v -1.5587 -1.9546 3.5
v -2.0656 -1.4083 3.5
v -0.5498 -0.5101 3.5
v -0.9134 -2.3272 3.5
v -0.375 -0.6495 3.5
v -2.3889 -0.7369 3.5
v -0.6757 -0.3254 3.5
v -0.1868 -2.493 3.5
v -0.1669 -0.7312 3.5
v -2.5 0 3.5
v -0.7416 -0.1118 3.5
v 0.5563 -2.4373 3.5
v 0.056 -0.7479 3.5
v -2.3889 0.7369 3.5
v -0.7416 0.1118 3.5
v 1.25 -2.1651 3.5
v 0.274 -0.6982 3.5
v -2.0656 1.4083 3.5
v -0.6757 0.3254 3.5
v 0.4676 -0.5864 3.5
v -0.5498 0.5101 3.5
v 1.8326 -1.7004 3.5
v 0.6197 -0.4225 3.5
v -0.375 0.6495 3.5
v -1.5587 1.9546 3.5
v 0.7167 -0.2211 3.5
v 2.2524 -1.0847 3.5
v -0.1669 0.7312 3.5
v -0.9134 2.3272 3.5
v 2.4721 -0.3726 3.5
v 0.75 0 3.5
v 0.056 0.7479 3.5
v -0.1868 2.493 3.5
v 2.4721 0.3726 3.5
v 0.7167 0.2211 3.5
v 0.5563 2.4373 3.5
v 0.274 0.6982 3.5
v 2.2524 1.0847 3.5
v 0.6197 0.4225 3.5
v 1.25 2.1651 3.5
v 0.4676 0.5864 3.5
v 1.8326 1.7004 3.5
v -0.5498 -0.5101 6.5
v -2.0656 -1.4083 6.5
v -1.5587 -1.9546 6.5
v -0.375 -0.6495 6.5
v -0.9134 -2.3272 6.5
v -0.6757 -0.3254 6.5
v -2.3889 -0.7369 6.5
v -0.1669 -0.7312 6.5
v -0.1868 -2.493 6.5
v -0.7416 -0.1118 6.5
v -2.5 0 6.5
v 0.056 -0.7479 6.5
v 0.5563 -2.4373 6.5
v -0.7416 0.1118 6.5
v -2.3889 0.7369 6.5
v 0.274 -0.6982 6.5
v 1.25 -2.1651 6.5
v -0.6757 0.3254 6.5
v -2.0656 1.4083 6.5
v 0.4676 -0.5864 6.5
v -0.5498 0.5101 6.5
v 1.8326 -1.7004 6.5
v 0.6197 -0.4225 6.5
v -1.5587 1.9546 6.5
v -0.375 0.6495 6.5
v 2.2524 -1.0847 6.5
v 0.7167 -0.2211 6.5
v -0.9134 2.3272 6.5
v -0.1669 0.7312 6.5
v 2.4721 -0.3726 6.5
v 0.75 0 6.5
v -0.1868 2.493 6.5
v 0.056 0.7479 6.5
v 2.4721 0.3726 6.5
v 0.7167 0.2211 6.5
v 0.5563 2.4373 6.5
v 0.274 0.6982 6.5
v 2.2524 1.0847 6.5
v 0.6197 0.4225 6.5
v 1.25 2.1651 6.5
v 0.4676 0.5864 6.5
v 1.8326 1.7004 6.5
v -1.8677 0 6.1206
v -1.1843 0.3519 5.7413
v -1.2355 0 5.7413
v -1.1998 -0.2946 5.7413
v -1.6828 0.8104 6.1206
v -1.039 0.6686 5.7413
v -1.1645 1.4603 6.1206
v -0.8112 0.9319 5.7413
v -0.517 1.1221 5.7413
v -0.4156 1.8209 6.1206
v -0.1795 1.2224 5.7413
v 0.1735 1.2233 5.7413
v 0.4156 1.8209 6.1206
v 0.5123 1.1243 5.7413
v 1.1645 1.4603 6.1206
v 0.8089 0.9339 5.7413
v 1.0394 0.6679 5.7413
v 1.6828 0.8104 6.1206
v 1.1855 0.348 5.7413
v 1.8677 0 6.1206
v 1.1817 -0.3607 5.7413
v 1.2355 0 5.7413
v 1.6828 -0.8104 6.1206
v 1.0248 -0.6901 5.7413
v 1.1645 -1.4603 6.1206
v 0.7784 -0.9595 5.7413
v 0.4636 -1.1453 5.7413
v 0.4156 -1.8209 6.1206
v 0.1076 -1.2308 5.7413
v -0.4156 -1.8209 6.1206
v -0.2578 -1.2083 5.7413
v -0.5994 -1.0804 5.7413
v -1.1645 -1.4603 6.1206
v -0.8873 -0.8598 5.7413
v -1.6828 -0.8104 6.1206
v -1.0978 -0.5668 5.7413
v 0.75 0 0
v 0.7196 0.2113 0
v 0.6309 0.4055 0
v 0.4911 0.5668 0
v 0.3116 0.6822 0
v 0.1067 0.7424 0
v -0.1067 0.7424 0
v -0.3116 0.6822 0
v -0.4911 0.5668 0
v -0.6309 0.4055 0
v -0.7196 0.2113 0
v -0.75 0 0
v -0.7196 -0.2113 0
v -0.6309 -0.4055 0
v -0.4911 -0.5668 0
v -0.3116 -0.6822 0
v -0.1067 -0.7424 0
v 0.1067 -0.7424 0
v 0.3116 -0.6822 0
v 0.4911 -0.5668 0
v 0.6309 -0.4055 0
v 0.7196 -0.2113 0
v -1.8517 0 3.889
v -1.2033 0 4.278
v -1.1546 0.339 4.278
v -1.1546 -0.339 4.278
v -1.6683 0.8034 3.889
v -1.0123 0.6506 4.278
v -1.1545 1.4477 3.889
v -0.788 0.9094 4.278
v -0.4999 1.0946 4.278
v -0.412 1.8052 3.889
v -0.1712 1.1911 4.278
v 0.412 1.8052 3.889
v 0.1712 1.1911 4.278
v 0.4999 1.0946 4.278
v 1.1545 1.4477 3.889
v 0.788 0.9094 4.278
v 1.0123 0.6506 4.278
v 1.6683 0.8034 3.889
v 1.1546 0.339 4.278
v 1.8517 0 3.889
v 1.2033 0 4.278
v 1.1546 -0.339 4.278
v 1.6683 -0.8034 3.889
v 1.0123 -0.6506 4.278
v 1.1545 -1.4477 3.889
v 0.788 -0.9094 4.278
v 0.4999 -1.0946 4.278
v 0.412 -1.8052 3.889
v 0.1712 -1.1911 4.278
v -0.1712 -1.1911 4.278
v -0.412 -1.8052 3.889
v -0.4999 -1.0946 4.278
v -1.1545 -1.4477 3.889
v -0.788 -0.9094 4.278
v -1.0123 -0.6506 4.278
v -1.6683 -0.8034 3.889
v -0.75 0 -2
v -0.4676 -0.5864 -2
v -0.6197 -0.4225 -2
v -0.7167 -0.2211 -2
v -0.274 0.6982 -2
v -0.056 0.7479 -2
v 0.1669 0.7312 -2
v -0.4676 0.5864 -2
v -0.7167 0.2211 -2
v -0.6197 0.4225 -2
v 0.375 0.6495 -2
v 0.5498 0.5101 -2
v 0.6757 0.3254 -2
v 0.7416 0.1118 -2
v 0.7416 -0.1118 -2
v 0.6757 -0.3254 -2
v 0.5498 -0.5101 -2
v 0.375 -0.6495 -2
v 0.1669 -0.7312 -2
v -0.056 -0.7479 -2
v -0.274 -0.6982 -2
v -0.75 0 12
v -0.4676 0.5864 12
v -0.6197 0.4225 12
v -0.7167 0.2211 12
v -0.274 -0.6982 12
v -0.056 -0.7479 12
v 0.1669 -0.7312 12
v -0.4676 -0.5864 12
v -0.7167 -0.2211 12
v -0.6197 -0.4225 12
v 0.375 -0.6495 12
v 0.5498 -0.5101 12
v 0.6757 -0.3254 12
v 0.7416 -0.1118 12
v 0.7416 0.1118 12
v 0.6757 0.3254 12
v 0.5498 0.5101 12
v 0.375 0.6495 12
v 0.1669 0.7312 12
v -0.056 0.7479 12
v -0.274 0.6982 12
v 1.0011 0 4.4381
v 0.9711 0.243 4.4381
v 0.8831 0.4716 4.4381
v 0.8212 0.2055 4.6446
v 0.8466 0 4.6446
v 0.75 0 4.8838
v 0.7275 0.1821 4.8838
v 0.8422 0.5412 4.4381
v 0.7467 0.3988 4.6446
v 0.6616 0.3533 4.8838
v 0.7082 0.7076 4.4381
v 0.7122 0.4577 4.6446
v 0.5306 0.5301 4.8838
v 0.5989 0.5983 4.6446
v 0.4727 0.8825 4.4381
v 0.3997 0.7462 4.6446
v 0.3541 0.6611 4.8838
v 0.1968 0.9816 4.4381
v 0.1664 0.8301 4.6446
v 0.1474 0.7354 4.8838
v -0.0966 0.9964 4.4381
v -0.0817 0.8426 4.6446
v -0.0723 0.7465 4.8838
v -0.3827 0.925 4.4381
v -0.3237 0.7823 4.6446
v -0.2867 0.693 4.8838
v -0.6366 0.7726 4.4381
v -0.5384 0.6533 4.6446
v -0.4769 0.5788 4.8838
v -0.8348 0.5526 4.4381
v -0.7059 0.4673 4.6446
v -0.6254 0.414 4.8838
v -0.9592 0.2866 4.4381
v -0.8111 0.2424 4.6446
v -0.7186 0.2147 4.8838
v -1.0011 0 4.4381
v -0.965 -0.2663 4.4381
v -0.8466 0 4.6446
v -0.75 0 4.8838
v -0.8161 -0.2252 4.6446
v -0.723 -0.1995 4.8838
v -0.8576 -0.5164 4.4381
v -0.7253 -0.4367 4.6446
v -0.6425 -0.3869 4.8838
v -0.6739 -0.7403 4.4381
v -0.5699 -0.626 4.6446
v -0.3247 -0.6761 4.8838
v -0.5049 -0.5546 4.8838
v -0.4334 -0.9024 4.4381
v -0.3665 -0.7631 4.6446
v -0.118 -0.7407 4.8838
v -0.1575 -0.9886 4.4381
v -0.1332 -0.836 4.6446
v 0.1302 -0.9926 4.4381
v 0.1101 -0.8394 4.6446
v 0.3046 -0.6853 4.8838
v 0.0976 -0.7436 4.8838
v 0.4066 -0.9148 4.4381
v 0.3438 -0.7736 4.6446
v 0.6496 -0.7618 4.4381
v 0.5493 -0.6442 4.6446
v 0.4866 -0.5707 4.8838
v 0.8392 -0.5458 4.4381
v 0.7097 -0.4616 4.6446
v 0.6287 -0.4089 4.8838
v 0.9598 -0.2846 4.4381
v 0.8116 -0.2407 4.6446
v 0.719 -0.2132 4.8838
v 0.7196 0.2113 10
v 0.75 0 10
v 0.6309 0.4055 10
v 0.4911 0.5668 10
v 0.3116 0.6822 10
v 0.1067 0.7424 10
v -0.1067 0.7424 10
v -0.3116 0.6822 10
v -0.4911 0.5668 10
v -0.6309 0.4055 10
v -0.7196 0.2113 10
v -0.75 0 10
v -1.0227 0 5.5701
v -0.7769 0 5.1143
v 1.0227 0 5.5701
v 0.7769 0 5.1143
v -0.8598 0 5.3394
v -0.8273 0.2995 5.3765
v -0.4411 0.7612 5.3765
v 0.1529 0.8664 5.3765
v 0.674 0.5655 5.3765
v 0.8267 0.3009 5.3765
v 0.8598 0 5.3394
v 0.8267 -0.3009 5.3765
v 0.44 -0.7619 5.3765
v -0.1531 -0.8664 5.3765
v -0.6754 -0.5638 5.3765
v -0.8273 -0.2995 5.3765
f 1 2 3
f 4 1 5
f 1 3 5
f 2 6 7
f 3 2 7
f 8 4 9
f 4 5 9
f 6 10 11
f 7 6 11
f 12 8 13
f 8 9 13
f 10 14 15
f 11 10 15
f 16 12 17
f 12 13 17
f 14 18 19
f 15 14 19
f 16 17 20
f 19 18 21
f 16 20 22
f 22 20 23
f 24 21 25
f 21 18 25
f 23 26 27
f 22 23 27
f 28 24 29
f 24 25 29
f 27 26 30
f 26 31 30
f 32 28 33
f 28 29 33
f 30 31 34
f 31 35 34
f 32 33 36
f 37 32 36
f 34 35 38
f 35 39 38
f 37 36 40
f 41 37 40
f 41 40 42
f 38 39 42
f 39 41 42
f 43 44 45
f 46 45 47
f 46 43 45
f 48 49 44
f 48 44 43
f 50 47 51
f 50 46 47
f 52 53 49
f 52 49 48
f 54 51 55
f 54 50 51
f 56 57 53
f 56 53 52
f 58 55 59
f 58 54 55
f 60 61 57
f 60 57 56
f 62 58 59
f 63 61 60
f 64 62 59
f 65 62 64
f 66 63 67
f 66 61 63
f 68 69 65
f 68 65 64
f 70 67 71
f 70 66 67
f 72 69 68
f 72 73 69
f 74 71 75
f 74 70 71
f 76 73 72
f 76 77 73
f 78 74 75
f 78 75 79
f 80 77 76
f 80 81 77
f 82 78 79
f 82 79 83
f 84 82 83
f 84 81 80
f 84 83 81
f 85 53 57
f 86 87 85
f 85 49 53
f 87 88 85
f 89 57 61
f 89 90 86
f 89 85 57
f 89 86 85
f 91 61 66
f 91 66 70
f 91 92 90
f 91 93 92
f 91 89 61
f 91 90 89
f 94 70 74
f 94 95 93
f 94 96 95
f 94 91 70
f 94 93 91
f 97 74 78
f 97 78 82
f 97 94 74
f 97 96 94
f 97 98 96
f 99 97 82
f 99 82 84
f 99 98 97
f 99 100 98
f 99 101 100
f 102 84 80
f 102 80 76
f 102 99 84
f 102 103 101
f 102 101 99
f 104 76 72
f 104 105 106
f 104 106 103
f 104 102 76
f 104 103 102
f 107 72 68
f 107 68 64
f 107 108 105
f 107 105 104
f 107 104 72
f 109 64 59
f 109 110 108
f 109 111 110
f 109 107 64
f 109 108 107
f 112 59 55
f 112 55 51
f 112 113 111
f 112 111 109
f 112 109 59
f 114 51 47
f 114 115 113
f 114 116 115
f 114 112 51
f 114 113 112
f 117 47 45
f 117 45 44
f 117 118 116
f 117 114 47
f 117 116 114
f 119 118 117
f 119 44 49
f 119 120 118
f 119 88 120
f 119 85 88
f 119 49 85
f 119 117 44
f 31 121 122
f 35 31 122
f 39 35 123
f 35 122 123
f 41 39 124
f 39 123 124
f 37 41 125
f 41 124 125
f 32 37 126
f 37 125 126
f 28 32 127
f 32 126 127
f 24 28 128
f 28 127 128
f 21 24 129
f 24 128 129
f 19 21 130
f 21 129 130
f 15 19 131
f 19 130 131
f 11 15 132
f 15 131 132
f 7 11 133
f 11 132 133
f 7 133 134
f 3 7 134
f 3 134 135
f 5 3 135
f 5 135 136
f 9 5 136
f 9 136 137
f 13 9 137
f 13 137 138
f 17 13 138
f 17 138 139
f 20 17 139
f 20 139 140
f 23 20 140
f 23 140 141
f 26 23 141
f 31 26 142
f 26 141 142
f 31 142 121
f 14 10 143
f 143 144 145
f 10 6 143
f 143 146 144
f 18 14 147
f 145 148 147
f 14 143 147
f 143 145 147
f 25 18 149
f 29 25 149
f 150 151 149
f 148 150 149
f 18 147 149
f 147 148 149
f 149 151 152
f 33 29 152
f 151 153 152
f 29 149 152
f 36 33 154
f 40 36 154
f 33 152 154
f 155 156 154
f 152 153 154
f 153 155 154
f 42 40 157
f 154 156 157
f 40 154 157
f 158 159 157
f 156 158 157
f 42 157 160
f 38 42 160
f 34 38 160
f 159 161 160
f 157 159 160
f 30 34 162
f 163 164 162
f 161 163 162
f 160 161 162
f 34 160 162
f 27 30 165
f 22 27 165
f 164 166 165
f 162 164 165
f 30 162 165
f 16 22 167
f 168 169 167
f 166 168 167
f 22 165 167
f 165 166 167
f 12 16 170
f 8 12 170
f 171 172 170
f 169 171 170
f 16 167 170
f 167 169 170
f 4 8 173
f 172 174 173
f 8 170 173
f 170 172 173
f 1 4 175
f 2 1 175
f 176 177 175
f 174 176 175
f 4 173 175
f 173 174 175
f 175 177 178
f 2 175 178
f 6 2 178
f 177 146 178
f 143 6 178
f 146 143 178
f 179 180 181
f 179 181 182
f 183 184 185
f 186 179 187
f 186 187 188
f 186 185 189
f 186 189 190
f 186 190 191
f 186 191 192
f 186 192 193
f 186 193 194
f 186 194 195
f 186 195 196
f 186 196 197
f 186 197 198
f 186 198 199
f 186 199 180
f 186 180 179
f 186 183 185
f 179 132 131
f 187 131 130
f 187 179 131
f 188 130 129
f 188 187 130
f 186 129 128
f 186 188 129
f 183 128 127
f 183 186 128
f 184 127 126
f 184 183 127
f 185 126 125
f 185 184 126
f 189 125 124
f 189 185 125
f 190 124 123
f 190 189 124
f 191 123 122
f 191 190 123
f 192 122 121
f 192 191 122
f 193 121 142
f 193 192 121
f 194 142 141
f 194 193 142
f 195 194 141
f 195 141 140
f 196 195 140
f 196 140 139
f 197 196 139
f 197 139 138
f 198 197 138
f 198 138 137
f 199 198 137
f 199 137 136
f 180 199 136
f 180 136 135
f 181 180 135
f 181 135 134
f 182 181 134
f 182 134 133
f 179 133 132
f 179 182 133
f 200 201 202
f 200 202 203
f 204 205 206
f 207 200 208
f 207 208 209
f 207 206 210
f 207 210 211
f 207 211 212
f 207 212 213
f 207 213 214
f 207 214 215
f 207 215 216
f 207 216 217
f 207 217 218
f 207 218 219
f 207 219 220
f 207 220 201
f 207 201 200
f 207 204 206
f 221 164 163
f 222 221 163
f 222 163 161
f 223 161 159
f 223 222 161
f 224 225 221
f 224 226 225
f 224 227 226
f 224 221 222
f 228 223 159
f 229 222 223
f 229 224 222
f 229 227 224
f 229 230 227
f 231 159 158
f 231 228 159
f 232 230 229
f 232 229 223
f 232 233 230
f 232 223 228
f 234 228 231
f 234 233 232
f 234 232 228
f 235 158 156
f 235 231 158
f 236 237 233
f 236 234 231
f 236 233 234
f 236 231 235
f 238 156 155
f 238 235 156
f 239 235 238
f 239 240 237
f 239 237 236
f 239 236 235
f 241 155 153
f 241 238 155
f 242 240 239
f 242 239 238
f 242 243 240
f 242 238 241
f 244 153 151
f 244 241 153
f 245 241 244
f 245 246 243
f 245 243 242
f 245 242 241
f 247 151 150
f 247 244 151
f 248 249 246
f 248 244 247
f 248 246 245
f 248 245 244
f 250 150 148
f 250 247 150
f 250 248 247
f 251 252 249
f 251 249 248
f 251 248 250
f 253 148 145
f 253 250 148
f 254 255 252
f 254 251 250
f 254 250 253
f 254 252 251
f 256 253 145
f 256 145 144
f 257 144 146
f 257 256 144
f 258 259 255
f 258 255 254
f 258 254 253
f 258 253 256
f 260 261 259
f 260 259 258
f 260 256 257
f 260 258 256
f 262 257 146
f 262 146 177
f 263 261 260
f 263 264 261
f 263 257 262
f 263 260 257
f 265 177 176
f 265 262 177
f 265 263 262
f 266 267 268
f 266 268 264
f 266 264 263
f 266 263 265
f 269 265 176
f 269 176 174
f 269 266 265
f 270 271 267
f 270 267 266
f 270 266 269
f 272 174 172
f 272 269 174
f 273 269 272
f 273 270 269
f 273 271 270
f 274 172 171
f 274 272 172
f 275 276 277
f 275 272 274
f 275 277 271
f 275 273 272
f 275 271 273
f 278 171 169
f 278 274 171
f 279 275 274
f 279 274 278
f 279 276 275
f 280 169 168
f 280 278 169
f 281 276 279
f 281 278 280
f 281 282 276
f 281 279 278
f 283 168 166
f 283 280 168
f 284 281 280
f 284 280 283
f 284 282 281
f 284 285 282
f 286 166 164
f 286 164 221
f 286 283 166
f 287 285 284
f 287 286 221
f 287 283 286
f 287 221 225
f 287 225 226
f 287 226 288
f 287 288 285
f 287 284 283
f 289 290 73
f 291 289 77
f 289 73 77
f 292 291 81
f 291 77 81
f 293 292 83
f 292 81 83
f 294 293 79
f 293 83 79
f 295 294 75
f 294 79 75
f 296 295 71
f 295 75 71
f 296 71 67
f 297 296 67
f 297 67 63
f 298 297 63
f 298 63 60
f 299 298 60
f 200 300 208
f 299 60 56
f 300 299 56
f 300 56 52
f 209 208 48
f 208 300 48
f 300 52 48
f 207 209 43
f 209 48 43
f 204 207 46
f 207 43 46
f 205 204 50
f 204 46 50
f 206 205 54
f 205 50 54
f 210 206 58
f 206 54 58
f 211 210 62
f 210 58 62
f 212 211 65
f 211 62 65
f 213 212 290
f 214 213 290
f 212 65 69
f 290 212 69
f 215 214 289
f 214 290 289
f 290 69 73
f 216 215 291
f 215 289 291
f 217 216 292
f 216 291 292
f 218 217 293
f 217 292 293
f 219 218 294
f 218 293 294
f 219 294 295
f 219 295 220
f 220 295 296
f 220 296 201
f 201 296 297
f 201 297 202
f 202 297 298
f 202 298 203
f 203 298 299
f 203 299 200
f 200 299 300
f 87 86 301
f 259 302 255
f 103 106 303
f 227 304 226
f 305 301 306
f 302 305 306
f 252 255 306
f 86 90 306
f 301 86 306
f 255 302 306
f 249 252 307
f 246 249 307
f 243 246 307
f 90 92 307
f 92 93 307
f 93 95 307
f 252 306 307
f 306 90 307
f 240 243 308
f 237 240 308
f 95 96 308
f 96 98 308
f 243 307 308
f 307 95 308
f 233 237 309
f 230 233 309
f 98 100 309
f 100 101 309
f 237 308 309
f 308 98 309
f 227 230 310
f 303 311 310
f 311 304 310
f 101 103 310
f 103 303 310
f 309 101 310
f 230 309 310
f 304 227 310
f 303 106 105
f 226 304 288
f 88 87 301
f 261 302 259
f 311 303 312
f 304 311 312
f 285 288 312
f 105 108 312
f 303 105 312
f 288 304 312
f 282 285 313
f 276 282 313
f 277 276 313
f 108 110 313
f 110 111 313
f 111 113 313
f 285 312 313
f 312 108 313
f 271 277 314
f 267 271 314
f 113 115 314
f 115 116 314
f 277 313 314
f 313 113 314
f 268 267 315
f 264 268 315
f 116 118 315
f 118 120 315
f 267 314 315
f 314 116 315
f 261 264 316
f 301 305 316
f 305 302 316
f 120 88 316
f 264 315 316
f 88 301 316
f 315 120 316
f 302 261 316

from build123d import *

# Parameters (mm, degrees)
SKETCH1_R           = 0.75
BOSS_EXTRUDE1_DEPTH = 10
FILLET3_R           = 1
BOSS_EXTRUDE3_START = 2
SKETCH4_R           = 0.75
BOSS_EXTRUDE3_DEPTH = 2
SKETCH5_R           = 0.75
BOSS_EXTRUDE4_DEPTH = 2


with BuildPart() as part:
    # Sketch1 → Boss-Extrude1 (new body)
    with BuildSketch(Plane.XY):
        Circle(SKETCH1_R)
    extrude(amount=BOSS_EXTRUDE1_DEPTH)

    # Sketch3 → Revolve1 (revolve)
    with BuildSketch(Plane(origin=(0, 0, 0), x_dir=(0, 0, -1), z_dir=(1, 0, 0)), mode=Mode.PRIVATE) as revolve1_sk:
        Polygon((-3.5, 0), (-3.5, 2.5), (-5, 0), align=None)
    revolve1 = revolve(revolve1_sk.sketch.rotate(Axis((0, 0, 5), (0, 0, -1)), 270), axis=Axis((0, 0, 5), (0, 0, -1)))

    # Mirror1: Revolve1 across plane
    add(revolve1.mirror(Plane(origin=(0, 0, 5), x_dir=(1, 0, 0), z_dir=(0, 0, -1))))

    # Fillet3
    fillet3_edges = [part.edges().sort_by_distance(p)[0] for p in [
        (0, -0.75, 5.45),
    ]]
    fillet(fillet3_edges, radius=FILLET3_R)

    # Fillet4: read off the stored shape, not the designer's step
    # Fillet4 outline → Fillet4 (revolve)
    with BuildSketch(Plane.XZ):
        with BuildLine():
            Line((0.75, 4.883809621), (0.75, 4.278013821))
            Line((0.75, 4.278013821), (1.203310298, 4.278013821))
            ThreePointArc((1.203310298, 4.278013821), (0.917148948, 4.536383889), (0.75, 4.883809621))
        make_face()
    revolve(axis=Axis((0, 0, 0), (0, 0, 1)))

    # Sketch4 → Boss-Extrude3 (add)
    with BuildSketch(Plane(origin=(0, 0, 0), x_dir=(-1, 0, 0), z_dir=(0, 0, -1)).offset(BOSS_EXTRUDE3_START)):
        Circle(SKETCH4_R)
    extrude(amount=-BOSS_EXTRUDE3_DEPTH)

    # Sketch5 → Boss-Extrude4 (add)
    with BuildSketch(Plane.XY.offset(10)):
        with Locations(Location((0, 0, 0), (0, 0, 180))):
            Circle(SKETCH5_R)
    extrude(amount=BOSS_EXTRUDE4_DEPTH)


solid = part.part
